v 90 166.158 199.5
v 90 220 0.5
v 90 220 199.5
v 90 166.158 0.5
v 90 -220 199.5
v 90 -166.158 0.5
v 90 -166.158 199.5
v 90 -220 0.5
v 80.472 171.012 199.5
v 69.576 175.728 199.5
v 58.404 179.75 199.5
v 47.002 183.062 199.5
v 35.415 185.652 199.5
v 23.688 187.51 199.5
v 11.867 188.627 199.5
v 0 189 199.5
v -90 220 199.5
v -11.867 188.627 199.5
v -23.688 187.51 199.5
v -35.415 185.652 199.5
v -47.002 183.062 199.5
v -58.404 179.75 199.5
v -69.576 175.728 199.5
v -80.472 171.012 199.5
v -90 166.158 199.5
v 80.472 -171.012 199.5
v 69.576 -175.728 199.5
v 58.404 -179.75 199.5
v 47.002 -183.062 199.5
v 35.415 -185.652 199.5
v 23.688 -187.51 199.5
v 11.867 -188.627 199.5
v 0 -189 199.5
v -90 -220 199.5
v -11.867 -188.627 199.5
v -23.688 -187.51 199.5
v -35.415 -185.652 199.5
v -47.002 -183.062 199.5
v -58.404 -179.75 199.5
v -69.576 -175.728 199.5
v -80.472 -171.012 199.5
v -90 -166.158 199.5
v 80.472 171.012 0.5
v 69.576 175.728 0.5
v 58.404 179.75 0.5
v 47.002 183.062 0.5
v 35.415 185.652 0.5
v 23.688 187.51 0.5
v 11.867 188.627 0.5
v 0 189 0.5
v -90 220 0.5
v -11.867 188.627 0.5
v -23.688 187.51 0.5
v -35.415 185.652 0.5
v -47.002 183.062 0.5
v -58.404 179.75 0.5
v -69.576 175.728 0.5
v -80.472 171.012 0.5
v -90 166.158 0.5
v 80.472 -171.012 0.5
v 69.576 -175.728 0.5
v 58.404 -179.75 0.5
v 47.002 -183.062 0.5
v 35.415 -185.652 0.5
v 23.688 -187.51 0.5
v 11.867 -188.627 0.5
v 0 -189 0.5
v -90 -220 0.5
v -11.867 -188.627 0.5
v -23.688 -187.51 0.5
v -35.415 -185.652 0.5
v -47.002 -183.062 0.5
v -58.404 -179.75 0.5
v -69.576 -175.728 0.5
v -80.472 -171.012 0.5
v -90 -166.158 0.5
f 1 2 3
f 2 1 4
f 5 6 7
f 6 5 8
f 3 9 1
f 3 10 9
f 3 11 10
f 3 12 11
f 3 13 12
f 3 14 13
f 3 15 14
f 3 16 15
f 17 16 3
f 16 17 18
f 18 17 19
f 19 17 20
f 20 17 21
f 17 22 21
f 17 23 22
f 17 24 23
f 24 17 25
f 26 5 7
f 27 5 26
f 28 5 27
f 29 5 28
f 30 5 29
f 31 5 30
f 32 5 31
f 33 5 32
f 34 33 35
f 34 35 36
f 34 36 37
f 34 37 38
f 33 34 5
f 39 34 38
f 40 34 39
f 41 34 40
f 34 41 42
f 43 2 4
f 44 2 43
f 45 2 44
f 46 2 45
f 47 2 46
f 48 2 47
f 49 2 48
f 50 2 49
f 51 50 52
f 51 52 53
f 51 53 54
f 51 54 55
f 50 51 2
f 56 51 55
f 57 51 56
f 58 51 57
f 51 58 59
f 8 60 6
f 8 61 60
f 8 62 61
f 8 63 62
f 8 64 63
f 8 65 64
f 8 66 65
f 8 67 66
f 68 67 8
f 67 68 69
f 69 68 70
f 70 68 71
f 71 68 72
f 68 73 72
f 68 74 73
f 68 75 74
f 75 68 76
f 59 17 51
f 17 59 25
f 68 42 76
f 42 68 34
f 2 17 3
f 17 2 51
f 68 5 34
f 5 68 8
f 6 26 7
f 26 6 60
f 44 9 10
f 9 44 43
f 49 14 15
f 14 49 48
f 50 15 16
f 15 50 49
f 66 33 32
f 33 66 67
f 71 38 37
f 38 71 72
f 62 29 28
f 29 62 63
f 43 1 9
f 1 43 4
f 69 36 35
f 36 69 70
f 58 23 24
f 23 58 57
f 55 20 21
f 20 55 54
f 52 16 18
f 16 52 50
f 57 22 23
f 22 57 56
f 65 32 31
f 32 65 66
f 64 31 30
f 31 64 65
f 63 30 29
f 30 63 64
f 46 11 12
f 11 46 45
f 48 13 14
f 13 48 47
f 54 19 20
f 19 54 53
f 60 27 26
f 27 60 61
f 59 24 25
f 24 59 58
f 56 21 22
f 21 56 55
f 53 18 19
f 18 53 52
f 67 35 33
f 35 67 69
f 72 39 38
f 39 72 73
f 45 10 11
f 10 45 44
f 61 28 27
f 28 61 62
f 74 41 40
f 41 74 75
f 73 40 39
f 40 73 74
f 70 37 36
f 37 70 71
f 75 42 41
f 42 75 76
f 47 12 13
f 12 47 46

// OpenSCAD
difference() {
translate([0,0,100]){cube([180,440,199], center = true);}
translate([0,0,100]) {cylinder (r = 189, h = 199, $fn = 100, center = true);}

union() {
linear_extrude(height = 200, twist = 90, $fn = 400) translate([-50,-100,0]){import(file = "wing.dxf", center = false, $fn = 100);} rotate([0,30,0]);

rotate([0,0,90]) {linear_extrude(height = 200, twist = 90, $fn = 400) translate([-50,-100,0]){import(file = "wing.dxf", center = false, $fn = 100);} rotate([0,30,0]);}

rotate([0,0,180]) {linear_extrude(height = 200, twist = 90, $fn = 400) translate([-50,-100,0]){import(file = "wing.dxf", center = false, $fn = 100);} rotate([0,30,0]);}

rotate([0,0,270]) {linear_extrude(height = 200, twist = 90, $fn = 400) translate([-50,-100,0]){import(file = "wing.dxf", center = false, $fn = 100);} rotate([0,30,0]);}
}
cylinder(h = 400, r = 180, center = true, $fn = 6);
}
